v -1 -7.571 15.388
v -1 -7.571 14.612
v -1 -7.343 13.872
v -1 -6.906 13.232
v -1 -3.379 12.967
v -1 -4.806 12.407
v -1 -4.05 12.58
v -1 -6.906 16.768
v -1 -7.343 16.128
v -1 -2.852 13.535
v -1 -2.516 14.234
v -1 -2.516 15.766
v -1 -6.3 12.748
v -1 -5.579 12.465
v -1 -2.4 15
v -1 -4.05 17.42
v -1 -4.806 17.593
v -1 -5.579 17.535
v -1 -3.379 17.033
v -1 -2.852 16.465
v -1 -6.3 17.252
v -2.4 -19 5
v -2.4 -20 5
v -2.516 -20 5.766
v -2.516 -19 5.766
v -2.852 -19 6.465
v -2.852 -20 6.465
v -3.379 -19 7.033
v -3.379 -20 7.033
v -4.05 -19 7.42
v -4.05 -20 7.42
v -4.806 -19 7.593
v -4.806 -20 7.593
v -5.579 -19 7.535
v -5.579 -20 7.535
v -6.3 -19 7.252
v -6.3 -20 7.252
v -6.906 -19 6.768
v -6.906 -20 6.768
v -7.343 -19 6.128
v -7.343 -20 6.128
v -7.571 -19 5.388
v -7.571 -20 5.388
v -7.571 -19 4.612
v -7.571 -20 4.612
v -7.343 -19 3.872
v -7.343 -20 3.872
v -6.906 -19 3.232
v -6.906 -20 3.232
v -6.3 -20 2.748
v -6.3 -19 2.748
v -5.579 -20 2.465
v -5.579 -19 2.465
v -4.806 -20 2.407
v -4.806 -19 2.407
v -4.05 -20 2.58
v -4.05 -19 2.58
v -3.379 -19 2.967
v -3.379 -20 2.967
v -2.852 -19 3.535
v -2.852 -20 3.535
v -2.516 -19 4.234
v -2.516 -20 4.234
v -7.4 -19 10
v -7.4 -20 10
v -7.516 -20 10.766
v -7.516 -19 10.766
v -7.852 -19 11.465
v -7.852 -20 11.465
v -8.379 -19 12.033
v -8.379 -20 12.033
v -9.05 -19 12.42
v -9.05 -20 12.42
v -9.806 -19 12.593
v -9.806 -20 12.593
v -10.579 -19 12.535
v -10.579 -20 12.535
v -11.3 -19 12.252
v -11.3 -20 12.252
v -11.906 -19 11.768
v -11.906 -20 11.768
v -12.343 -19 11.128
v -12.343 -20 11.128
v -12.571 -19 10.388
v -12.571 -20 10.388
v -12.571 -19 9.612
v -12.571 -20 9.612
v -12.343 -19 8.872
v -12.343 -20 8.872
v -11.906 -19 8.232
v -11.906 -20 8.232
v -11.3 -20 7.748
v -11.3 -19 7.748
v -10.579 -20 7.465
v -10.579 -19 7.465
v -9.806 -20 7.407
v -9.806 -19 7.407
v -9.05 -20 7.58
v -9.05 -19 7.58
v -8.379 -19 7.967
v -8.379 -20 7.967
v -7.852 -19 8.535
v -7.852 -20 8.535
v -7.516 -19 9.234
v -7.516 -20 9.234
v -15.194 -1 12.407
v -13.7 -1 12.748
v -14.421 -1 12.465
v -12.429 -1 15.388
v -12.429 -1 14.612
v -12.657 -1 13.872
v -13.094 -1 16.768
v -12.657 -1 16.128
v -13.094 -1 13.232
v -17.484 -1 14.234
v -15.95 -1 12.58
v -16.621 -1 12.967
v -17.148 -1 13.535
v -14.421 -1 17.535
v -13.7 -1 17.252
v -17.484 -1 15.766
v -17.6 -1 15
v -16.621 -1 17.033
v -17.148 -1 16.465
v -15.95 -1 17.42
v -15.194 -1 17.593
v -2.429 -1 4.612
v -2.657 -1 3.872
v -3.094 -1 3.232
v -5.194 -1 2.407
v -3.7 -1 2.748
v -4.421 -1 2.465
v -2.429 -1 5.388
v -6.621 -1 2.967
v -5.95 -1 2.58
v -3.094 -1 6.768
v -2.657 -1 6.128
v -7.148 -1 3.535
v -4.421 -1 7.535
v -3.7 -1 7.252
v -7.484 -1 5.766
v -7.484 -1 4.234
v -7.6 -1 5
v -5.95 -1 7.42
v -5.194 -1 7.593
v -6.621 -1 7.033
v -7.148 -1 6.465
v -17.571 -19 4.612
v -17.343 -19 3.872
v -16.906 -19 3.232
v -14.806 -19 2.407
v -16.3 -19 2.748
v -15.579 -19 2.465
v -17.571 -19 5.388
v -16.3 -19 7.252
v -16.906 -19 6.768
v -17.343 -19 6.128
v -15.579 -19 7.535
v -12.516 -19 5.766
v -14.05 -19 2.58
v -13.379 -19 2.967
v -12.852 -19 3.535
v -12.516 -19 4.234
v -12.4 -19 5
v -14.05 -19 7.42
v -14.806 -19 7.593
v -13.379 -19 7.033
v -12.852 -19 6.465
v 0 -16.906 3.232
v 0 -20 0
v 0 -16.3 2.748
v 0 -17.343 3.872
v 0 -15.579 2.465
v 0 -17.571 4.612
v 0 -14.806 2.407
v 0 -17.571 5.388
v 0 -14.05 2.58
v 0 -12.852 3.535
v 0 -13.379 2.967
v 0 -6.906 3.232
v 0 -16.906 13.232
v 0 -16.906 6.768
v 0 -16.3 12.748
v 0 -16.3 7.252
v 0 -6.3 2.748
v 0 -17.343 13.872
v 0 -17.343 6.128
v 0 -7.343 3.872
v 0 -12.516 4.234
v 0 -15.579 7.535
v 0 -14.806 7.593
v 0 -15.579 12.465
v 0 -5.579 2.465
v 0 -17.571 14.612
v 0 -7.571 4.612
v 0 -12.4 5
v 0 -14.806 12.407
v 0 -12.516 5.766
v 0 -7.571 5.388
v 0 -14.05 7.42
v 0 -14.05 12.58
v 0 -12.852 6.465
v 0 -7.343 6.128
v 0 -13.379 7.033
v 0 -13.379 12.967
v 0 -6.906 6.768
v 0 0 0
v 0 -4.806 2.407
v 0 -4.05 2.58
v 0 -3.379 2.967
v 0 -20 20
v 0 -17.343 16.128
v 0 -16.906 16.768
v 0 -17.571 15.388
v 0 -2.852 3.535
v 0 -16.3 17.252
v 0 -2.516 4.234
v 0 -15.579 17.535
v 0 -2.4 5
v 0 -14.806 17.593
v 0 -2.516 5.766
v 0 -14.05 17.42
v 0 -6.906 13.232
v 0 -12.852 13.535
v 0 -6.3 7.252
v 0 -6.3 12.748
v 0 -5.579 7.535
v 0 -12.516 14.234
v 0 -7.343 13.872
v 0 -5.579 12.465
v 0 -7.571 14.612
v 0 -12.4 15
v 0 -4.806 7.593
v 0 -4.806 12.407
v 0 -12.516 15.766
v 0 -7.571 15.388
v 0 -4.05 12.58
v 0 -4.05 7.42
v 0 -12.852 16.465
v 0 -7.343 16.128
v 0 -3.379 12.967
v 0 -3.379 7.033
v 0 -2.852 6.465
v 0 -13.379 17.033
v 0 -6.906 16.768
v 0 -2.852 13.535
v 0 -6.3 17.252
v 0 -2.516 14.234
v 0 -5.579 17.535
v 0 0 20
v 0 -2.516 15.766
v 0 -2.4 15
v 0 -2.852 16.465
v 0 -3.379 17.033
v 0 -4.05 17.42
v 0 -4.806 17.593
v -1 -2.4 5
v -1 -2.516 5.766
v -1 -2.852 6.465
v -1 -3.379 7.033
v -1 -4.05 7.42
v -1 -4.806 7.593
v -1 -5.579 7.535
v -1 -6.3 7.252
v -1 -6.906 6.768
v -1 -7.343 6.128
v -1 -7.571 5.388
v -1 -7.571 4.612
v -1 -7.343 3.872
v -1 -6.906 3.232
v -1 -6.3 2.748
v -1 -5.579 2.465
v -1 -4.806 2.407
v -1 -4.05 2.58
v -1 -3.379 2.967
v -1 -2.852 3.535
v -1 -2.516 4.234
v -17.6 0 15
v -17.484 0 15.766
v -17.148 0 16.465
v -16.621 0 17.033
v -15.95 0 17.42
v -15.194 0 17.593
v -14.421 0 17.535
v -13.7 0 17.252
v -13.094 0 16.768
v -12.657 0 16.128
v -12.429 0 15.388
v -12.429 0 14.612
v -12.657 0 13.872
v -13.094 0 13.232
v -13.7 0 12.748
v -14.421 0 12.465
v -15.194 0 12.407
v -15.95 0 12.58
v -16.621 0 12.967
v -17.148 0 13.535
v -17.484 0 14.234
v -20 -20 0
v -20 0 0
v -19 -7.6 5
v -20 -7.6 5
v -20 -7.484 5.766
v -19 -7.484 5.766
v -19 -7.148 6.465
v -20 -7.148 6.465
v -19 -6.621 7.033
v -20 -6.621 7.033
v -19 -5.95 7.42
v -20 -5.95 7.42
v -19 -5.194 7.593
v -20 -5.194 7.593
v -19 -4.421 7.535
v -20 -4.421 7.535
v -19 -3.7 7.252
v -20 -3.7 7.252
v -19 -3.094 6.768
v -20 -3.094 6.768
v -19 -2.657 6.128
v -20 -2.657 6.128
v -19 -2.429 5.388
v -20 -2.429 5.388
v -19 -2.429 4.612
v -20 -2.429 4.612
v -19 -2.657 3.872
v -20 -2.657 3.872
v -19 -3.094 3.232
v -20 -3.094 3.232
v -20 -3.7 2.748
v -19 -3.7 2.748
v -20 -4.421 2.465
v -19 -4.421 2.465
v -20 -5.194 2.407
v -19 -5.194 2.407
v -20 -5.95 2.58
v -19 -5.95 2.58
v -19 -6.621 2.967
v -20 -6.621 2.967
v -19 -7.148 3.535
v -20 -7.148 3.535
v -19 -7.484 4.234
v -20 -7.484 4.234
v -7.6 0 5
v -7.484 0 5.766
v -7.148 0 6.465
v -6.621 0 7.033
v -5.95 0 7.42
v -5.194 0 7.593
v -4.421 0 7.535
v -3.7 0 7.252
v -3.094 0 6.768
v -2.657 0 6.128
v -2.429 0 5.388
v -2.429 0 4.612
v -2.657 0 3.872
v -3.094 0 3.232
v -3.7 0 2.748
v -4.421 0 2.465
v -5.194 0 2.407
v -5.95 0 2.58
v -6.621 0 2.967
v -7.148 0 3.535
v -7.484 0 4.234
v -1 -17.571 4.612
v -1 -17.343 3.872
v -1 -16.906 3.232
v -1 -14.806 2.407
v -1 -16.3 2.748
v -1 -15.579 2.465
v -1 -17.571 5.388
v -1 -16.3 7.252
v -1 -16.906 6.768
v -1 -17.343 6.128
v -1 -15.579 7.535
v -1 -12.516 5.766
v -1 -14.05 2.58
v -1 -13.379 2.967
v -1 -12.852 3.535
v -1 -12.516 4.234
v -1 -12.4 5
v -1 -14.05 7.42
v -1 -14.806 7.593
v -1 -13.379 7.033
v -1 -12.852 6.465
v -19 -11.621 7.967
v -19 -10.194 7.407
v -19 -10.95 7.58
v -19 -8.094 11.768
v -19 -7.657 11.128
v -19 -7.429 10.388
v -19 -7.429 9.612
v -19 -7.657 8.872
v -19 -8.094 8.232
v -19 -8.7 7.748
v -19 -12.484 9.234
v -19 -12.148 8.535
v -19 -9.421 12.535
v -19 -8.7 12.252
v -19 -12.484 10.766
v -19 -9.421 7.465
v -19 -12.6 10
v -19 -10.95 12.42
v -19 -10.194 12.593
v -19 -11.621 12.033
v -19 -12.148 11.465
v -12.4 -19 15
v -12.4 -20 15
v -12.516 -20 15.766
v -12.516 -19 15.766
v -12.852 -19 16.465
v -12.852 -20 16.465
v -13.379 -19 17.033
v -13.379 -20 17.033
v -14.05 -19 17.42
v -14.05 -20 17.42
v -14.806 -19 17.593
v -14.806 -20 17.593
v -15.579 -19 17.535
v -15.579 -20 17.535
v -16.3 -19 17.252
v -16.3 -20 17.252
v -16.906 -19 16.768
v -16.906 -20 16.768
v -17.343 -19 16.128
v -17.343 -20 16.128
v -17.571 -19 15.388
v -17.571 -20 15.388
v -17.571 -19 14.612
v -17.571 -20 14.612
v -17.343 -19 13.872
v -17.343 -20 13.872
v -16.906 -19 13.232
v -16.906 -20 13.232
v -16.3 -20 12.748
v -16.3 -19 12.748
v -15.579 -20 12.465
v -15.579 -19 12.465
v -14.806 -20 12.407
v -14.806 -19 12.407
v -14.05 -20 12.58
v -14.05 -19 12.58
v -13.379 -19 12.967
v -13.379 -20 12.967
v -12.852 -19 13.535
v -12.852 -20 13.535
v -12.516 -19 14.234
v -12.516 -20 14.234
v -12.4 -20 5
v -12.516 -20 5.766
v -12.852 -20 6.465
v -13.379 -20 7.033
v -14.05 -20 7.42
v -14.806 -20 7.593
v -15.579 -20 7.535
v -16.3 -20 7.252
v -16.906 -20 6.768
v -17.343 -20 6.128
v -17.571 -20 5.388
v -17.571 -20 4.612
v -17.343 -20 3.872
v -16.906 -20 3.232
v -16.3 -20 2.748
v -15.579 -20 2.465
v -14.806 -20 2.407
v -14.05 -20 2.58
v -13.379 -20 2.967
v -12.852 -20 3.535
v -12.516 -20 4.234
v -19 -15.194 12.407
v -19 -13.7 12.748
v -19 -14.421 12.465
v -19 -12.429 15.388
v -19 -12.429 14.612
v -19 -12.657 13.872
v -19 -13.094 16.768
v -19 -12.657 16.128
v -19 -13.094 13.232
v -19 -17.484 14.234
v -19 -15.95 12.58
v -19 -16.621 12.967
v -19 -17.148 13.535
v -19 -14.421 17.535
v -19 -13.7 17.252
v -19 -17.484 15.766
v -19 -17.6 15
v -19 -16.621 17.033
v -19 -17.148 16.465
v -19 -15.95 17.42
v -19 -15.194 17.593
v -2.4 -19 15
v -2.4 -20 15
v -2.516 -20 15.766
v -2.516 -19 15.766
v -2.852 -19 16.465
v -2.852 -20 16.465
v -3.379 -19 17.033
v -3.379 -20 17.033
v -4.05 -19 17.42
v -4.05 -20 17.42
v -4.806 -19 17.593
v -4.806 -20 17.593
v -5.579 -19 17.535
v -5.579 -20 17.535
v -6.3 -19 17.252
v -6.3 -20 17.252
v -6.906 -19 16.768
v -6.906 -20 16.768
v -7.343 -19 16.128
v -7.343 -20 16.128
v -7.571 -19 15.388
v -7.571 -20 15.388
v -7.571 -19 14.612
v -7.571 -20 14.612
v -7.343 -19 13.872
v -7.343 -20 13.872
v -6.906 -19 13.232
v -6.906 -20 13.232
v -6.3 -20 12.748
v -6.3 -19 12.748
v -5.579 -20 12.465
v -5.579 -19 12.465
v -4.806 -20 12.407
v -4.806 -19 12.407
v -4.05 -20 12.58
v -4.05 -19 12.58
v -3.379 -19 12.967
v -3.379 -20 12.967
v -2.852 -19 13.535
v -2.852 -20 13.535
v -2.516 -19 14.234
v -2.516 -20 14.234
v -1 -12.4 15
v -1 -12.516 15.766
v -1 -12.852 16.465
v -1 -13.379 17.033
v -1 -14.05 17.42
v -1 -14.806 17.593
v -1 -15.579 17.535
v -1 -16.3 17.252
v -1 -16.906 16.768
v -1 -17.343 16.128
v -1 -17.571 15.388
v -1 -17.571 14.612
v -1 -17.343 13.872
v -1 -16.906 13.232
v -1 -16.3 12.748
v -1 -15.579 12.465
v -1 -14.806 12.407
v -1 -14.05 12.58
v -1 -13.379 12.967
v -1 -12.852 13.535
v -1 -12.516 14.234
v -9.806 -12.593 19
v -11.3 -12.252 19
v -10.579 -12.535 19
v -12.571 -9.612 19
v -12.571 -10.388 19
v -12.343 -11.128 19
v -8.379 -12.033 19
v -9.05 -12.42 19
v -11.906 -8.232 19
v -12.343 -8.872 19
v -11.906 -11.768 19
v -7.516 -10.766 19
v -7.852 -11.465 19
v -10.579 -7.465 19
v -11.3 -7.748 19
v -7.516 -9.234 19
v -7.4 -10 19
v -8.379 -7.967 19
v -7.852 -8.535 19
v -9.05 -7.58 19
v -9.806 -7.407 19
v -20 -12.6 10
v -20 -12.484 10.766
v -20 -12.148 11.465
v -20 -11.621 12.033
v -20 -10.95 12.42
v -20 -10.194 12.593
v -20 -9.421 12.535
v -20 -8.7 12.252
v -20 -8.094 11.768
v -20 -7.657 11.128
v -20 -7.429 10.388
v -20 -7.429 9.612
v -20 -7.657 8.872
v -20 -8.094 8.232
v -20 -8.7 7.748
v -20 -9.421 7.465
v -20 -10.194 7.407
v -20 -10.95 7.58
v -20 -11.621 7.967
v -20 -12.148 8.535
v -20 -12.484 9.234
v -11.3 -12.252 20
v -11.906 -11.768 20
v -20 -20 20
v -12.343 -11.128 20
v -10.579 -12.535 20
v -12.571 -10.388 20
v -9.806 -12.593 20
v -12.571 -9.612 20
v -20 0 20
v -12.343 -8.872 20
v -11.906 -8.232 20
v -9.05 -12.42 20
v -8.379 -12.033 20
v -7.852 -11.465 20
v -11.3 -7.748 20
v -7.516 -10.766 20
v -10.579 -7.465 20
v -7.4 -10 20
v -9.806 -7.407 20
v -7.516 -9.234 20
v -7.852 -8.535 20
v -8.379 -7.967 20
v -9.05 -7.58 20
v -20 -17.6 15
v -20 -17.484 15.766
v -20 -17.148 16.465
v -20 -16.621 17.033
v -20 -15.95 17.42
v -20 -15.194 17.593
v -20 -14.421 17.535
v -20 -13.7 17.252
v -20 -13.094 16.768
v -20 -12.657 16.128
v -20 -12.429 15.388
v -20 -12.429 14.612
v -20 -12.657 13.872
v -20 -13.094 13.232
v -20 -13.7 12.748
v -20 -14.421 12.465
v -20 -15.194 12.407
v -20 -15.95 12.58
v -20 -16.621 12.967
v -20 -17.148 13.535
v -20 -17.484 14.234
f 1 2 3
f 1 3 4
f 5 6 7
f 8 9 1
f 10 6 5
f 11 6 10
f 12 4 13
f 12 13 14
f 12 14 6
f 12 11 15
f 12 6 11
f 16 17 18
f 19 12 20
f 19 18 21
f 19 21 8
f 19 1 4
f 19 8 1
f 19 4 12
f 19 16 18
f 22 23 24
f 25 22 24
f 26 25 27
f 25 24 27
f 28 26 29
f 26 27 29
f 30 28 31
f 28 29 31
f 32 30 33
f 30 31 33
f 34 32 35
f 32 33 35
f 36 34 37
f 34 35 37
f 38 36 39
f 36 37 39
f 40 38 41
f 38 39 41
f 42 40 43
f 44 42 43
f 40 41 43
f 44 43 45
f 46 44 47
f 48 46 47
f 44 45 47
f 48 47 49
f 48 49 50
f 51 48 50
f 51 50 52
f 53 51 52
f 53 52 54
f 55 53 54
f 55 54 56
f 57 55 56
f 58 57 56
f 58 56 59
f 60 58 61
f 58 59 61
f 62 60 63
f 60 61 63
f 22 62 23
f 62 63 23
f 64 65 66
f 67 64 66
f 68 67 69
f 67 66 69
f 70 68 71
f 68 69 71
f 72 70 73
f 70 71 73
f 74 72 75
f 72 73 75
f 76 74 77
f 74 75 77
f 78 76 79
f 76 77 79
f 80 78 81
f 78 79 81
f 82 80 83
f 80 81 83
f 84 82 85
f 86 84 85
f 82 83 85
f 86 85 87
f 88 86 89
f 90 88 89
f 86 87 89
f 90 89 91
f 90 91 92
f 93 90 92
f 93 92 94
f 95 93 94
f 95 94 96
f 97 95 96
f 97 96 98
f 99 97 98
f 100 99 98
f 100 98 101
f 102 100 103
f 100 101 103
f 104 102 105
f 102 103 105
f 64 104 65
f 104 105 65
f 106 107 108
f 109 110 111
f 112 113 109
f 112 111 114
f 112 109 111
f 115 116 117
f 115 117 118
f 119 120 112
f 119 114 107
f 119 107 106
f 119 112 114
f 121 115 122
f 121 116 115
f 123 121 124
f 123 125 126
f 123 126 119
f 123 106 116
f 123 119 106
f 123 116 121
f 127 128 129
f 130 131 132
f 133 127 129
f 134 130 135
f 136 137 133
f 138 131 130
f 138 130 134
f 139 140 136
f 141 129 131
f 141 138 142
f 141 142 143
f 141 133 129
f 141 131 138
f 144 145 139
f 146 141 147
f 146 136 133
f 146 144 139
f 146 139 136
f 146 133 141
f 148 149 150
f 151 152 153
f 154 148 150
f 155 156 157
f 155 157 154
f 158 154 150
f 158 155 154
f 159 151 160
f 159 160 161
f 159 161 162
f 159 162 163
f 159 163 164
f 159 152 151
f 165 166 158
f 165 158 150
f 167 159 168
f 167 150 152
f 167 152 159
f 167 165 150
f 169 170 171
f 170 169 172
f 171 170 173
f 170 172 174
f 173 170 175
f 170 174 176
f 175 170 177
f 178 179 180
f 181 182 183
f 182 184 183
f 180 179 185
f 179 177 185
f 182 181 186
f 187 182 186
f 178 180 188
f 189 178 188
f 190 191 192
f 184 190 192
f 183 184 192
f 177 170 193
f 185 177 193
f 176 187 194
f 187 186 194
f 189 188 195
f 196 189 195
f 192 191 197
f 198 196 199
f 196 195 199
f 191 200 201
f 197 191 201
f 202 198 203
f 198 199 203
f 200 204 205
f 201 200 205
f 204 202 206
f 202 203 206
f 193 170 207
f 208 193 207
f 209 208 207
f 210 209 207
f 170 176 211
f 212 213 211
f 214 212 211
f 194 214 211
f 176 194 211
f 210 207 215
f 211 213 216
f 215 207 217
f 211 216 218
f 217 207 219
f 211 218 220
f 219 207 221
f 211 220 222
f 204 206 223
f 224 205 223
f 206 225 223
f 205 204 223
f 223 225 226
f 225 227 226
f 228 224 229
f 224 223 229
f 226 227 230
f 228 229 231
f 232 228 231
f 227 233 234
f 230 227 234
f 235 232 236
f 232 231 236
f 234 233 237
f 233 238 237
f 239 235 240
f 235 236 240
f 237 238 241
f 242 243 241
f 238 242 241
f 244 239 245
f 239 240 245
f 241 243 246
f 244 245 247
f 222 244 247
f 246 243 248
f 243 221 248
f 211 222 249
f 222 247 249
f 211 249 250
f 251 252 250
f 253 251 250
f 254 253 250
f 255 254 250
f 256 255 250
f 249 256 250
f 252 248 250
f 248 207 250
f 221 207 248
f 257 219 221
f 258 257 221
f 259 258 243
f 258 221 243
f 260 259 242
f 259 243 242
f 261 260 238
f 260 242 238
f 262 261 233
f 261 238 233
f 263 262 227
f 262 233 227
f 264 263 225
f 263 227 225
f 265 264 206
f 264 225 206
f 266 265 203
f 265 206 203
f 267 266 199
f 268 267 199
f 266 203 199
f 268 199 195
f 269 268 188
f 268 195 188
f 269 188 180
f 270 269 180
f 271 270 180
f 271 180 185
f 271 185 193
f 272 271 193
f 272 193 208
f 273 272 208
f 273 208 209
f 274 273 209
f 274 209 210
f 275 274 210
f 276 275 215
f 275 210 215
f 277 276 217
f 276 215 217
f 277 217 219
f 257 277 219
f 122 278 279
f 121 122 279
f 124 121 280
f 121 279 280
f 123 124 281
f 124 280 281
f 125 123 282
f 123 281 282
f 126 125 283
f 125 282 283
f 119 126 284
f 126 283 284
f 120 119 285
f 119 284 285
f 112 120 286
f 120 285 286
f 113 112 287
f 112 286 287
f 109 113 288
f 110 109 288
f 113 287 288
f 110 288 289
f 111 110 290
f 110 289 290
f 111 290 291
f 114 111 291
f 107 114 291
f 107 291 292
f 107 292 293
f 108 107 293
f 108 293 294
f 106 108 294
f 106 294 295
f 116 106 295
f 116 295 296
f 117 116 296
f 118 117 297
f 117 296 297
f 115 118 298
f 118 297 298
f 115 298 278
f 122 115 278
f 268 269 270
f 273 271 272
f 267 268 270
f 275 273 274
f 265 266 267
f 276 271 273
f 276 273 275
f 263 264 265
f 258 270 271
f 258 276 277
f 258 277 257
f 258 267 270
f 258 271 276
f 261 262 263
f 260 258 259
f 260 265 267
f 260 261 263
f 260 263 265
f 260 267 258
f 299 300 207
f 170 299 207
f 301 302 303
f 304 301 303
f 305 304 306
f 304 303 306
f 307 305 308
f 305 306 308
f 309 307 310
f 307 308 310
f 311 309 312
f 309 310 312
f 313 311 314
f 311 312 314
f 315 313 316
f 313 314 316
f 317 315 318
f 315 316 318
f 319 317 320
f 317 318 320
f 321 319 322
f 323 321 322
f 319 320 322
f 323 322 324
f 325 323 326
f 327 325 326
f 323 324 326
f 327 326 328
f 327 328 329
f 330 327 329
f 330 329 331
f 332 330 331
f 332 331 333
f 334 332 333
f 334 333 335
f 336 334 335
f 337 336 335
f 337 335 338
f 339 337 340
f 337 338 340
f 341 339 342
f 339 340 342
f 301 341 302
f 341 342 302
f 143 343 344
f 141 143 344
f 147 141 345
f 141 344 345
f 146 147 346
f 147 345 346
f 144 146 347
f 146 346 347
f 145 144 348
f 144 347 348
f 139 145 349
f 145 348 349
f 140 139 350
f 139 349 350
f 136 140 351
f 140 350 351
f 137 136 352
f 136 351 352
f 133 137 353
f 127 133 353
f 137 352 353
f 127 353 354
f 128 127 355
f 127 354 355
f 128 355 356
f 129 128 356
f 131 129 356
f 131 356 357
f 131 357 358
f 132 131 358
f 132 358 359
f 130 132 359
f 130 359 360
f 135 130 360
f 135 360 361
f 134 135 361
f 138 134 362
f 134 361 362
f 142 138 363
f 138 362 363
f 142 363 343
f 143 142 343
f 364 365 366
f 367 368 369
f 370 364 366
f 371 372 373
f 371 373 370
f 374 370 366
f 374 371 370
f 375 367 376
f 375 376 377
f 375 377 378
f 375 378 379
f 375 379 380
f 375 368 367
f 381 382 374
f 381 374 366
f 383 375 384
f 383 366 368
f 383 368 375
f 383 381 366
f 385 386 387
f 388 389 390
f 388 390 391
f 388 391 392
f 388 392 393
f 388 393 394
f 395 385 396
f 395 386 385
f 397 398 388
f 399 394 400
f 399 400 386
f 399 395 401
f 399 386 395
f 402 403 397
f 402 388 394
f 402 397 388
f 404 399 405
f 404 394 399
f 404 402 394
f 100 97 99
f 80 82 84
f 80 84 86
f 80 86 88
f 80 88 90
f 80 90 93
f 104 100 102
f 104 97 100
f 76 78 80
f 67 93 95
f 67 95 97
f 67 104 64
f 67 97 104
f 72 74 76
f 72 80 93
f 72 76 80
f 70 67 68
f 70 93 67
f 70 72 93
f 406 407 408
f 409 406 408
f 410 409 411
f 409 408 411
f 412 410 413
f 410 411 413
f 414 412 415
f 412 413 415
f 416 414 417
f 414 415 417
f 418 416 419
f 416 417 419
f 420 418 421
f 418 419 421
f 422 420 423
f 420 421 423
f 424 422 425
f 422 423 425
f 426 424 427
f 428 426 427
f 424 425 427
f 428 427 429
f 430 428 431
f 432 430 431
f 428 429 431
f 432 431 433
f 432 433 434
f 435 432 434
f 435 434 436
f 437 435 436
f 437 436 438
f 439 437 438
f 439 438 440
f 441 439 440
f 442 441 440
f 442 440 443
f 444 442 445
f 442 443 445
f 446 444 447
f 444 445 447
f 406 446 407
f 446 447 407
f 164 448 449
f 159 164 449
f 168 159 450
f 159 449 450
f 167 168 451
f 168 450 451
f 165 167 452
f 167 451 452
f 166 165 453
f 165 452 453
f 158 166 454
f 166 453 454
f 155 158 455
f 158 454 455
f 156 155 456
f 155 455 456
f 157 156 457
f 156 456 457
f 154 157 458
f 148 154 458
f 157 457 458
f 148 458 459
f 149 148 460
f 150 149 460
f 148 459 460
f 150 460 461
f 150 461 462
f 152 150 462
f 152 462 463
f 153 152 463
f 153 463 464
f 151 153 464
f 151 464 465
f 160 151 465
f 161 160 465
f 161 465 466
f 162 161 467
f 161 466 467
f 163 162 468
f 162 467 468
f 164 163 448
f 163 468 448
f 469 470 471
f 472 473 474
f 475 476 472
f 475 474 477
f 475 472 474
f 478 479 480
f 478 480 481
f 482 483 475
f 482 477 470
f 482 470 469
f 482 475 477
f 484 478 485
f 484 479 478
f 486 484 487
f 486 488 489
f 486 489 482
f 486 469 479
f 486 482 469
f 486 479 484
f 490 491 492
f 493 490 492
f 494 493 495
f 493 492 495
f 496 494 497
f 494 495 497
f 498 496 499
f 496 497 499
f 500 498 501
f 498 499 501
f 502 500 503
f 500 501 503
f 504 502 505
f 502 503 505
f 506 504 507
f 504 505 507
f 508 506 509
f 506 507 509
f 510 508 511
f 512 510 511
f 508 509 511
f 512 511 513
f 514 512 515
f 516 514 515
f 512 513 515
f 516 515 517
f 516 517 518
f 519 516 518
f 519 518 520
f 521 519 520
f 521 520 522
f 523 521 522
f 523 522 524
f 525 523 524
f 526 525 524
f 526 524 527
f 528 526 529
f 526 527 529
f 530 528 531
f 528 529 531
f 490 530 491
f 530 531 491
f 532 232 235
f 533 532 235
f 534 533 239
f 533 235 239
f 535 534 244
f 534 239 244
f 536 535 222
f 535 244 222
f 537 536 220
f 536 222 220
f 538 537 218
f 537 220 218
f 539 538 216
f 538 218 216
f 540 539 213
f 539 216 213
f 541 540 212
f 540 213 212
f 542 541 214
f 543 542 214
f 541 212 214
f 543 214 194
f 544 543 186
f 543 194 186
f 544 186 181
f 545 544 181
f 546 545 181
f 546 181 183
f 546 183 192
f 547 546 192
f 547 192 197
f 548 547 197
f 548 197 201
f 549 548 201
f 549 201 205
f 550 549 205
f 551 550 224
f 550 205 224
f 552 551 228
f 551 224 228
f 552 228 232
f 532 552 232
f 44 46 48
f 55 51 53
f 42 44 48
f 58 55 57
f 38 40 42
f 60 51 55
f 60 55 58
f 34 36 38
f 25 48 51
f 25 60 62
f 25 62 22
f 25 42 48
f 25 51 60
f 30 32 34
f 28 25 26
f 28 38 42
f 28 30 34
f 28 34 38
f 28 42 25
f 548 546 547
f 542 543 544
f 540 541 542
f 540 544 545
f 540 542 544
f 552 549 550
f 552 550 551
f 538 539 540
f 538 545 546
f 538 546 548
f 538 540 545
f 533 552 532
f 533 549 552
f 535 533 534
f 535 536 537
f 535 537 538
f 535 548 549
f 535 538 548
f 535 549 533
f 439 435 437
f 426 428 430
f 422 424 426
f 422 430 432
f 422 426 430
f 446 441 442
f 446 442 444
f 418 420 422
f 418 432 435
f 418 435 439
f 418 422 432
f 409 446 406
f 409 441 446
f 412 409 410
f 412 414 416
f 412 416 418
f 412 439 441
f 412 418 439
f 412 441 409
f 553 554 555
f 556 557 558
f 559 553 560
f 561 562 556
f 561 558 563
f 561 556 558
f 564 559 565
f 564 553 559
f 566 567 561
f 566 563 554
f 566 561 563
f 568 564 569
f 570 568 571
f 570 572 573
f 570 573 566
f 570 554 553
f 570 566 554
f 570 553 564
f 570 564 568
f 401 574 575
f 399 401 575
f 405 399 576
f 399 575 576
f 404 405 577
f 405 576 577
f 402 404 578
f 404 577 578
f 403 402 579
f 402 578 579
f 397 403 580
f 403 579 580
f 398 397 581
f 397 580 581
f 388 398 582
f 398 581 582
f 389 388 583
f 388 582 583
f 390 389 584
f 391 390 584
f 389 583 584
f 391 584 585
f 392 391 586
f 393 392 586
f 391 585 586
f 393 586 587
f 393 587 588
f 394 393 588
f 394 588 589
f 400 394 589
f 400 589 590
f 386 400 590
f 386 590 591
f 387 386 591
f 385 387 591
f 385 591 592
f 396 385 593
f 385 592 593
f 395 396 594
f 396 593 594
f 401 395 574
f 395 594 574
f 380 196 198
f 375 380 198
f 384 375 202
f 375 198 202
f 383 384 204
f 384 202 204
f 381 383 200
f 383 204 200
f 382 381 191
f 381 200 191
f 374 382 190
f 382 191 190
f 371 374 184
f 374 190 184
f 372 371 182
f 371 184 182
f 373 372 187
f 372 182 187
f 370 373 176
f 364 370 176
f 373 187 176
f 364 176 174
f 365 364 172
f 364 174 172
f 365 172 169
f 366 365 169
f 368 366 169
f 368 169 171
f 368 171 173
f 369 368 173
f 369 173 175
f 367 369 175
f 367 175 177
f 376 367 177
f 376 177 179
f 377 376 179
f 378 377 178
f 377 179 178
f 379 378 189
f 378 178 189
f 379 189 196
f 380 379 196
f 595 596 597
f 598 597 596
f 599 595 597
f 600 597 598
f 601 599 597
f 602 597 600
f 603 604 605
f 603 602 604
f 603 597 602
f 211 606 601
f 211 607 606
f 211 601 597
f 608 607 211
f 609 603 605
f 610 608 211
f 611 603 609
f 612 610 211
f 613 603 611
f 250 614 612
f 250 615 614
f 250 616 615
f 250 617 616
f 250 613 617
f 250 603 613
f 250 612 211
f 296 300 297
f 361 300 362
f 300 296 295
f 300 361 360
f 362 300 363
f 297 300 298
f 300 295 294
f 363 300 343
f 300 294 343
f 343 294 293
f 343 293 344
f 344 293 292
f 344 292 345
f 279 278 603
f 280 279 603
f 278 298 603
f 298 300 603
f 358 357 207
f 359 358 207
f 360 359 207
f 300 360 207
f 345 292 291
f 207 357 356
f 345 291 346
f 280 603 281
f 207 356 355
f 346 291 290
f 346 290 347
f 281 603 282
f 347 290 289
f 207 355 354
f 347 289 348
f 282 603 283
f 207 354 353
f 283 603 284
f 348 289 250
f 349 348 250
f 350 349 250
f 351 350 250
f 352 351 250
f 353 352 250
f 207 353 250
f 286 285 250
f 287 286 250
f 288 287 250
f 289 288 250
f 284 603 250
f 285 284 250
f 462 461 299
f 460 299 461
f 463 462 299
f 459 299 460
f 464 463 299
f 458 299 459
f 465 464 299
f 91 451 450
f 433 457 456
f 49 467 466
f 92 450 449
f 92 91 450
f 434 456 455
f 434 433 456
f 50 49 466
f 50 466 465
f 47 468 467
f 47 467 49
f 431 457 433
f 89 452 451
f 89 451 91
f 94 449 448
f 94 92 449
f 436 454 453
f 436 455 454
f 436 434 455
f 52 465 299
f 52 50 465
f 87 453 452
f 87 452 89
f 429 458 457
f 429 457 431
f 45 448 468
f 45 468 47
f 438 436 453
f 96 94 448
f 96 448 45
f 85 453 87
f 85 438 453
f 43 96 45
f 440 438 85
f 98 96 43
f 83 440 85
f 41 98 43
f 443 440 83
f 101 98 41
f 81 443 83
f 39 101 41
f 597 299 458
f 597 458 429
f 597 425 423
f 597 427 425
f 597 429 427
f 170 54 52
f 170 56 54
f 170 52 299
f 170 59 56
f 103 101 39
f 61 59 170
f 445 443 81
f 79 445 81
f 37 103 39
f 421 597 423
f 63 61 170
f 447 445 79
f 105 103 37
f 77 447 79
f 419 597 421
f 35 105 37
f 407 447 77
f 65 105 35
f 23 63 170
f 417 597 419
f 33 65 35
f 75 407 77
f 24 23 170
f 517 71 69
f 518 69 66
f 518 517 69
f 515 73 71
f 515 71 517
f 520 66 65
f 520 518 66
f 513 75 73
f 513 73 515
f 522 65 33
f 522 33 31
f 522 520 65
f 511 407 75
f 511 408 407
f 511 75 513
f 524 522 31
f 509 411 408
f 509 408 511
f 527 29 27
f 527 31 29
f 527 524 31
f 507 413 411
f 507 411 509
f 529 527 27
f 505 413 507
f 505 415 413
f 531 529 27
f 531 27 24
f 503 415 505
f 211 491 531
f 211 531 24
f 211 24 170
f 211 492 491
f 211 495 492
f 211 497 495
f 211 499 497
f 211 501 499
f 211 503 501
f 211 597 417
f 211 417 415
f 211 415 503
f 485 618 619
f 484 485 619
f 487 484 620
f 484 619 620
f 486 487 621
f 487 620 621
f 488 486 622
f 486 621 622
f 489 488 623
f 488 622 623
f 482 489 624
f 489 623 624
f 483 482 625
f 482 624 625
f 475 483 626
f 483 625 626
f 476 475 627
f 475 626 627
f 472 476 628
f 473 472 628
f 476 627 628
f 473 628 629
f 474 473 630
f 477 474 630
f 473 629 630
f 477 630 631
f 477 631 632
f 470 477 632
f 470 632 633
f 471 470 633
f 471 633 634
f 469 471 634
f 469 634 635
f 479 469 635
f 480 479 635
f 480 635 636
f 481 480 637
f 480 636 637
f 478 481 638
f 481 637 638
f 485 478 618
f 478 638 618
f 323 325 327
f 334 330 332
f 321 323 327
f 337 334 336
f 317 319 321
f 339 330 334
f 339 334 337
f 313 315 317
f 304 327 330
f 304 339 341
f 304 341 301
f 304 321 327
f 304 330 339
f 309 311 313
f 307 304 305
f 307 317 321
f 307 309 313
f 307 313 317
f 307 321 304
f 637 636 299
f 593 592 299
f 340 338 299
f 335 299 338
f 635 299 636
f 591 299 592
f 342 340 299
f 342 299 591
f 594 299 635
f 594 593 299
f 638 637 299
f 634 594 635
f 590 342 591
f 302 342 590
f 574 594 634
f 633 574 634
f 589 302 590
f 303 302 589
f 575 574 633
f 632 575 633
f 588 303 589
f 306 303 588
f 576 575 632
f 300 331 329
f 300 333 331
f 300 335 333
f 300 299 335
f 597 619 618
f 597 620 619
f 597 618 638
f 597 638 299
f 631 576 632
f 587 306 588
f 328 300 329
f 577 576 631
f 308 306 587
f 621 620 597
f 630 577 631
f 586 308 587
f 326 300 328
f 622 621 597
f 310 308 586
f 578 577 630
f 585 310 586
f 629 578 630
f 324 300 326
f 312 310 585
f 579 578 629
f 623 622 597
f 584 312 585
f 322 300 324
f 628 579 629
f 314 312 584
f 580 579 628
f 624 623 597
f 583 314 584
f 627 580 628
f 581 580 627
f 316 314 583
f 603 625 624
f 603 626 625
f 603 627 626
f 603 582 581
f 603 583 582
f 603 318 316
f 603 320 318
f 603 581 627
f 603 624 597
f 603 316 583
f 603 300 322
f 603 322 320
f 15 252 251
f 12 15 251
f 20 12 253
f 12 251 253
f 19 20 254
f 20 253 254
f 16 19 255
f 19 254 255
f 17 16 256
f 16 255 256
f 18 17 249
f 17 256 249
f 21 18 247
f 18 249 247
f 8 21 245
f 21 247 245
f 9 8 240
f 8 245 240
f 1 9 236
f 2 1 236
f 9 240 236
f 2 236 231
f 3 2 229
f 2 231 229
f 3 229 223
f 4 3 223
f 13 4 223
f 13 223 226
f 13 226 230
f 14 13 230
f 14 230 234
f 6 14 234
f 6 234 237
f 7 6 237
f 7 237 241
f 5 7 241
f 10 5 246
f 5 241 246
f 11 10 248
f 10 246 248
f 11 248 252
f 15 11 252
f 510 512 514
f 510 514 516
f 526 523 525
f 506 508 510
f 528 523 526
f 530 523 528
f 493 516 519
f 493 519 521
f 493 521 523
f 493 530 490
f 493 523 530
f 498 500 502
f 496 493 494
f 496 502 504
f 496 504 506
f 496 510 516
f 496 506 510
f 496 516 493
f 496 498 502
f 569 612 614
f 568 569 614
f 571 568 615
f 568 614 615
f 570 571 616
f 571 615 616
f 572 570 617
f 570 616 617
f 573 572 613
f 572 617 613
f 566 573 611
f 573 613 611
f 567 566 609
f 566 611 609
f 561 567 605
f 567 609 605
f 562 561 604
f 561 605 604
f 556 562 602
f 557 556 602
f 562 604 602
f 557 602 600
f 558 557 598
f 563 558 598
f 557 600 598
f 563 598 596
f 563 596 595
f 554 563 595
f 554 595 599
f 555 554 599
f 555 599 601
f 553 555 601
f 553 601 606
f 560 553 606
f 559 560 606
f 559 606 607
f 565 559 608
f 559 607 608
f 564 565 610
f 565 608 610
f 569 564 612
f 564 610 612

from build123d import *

# Parameters (mm, degrees)
F0_W      = 20
F0_H      = 20
F1_DEPTH  = 20
F2_R      = 2.6
F3_DEPTH  = 1
F4_R      = 2.6
F5_DEPTH  = 1
F6_R      = 2.6
F7_DEPTH  = 1
F8_R      = 2.6
F9_DEPTH  = 1
F10_R     = 2.6
F11_DEPTH = 1


with BuildPart() as f1:
    # F0 (on Front) → F1 (new body)
    with BuildSketch(Plane.XZ):
        with Locations((-10, 10)):
            Rectangle(F0_W, F0_H)
    extrude(amount=F1_DEPTH)

    # F2 (on face) → F3 (cut)
    with BuildSketch(Plane.XZ.offset(20)):
        with Locations((-15, 15)):
            Circle(F2_R)
        with Locations((-10, 10)):
            Circle(F2_R)
        with Locations((-15, 5)):
            Circle(F2_R)
        with Locations((-5, 15)):
            Circle(F2_R)
        with Locations((-5, 5)):
            Circle(F2_R)
    extrude(amount=-F3_DEPTH, mode=Mode.SUBTRACT)

    # F4 (on face) → F5 (cut)
    with BuildSketch(Plane(origin=(0, 0, 0), x_dir=(-1, 0, 0), z_dir=(0, 1, 0))):
        with Locations((15, 15)):
            Circle(F4_R)
        with Locations((5, 5)):
            Circle(F4_R)
    extrude(amount=-F5_DEPTH, mode=Mode.SUBTRACT)

    # F6 (on face) → F7 (cut)
    with BuildSketch(Plane.XY.offset(20)):
        with Locations((-10, -10)):
            Circle(F6_R)
    extrude(amount=-F7_DEPTH, mode=Mode.SUBTRACT)

    # F8 (on face) → F9 (cut)
    with BuildSketch(Plane(origin=(-20, 0, 0), x_dir=(0, -1, 0), z_dir=(-1, 0, 0))):
        with Locations((10, 10)):
            Circle(F8_R)
        with Locations((15, 15)):
            Circle(F8_R)
        with Locations((5, 5)):
            Circle(F8_R)
    extrude(amount=-F9_DEPTH, mode=Mode.SUBTRACT)

    # F10 (on face) → F11 (cut)
    with BuildSketch(Plane.YZ):
        with Locations((-15, 15)):
            Circle(F10_R)
        with Locations((-15, 5)):
            Circle(F10_R)
        with Locations((-5, 15)):
            Circle(F10_R)
        with Locations((-5, 5)):
            Circle(F10_R)
    extrude(amount=-F11_DEPTH, mode=Mode.SUBTRACT)


solid = f1.part
